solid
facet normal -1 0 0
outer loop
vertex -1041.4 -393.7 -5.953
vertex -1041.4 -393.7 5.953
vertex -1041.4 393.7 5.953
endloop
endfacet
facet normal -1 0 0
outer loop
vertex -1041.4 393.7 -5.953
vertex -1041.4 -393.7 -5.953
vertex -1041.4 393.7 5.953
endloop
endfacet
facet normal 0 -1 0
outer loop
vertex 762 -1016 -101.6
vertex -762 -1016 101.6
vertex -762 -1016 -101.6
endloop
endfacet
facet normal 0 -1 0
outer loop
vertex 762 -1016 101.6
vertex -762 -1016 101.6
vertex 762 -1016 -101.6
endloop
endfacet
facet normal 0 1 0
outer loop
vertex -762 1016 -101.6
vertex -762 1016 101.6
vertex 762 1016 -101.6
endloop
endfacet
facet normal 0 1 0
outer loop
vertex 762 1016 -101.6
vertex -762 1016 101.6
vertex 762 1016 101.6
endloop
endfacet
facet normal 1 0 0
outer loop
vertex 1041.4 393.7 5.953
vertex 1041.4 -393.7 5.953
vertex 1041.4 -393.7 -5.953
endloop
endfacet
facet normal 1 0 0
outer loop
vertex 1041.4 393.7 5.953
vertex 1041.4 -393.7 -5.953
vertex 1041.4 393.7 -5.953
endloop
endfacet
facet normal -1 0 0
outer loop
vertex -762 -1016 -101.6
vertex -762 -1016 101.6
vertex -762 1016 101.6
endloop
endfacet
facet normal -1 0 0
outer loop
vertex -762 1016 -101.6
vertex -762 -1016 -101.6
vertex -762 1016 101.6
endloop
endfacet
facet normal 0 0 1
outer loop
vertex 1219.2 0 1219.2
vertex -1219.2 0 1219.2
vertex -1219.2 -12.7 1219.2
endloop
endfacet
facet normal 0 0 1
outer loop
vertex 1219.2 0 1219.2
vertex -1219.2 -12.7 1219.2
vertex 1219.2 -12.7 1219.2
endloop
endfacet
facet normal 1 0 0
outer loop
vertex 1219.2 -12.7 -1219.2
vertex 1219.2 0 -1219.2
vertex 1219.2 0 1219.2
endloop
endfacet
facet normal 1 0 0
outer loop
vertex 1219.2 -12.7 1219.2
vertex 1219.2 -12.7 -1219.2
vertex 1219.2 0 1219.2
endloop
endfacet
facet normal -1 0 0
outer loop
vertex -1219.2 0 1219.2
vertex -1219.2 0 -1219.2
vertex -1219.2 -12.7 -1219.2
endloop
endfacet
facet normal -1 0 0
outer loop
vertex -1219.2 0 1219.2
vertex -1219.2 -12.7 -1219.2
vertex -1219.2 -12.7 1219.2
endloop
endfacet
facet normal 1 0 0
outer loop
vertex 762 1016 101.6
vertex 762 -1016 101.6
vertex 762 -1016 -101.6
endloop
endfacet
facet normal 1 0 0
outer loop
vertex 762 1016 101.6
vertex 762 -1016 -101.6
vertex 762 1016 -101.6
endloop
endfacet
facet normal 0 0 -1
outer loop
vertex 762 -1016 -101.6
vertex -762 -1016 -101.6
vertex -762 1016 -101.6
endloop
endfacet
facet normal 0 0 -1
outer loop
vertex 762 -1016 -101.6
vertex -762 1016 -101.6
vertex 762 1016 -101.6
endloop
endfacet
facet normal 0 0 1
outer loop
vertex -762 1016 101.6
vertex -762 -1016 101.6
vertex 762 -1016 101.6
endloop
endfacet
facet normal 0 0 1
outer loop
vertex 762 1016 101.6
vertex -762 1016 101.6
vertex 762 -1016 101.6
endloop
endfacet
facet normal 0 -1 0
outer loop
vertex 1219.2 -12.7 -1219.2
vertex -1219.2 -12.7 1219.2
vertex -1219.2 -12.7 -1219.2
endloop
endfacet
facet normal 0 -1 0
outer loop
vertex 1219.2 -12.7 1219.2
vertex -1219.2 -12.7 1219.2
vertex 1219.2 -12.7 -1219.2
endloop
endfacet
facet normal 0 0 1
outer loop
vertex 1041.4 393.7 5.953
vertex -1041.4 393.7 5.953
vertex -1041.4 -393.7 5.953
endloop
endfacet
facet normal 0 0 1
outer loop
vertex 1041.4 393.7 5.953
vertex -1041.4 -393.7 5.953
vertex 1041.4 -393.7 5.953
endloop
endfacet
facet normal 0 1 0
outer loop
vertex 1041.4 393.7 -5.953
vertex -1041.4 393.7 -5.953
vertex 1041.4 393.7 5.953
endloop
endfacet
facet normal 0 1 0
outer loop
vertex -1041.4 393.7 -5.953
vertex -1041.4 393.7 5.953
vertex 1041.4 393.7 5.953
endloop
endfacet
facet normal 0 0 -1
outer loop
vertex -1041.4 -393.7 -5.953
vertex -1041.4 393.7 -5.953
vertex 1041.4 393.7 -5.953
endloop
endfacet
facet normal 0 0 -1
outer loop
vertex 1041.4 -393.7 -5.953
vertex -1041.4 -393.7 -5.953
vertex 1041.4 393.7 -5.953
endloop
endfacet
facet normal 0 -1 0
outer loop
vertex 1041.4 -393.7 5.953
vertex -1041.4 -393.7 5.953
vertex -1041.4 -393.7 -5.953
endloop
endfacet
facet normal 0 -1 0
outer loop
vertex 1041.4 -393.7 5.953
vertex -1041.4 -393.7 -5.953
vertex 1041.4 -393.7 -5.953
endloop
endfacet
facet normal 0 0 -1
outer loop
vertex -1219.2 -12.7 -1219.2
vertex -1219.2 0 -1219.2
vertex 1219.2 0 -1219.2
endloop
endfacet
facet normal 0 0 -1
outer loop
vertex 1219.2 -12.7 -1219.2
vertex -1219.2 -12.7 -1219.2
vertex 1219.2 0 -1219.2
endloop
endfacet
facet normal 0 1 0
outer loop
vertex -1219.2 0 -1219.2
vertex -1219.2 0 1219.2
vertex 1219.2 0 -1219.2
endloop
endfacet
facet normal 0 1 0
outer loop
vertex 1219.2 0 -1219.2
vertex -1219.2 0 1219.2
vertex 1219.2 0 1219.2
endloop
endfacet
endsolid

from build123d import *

# Parameters (mm, degrees)
F0_W     = 2082.8
F0_H     = 787.4
F1_DEPTH = 5.953125
F2_W     = 1524
F2_H     = 2032
F3_DEPTH = 101.6
F4_W     = 2438.4
F4_H     = 2438.4
F5_DEPTH = 12.7


with BuildPart() as f1:
    # F0 (on Top) → F1 (new body, symmetric)
    with BuildSketch(Plane.XY):
        Rectangle(F0_W, F0_H)
    extrude(amount=F1_DEPTH, both=True)


with BuildPart() as f3:
    # F2 (on Top) → F3 (new body, symmetric)
    with BuildSketch(Plane.XY):
        Rectangle(F2_W, F2_H)
    extrude(amount=F3_DEPTH, both=True)


with BuildPart() as f5:
    # F4 (on Front) → F5 (new body)
    with BuildSketch(Plane.XZ):
        Rectangle(F4_W, F4_H)
    extrude(amount=F5_DEPTH)


solid = Compound([f1.part, f3.part, f5.part])
